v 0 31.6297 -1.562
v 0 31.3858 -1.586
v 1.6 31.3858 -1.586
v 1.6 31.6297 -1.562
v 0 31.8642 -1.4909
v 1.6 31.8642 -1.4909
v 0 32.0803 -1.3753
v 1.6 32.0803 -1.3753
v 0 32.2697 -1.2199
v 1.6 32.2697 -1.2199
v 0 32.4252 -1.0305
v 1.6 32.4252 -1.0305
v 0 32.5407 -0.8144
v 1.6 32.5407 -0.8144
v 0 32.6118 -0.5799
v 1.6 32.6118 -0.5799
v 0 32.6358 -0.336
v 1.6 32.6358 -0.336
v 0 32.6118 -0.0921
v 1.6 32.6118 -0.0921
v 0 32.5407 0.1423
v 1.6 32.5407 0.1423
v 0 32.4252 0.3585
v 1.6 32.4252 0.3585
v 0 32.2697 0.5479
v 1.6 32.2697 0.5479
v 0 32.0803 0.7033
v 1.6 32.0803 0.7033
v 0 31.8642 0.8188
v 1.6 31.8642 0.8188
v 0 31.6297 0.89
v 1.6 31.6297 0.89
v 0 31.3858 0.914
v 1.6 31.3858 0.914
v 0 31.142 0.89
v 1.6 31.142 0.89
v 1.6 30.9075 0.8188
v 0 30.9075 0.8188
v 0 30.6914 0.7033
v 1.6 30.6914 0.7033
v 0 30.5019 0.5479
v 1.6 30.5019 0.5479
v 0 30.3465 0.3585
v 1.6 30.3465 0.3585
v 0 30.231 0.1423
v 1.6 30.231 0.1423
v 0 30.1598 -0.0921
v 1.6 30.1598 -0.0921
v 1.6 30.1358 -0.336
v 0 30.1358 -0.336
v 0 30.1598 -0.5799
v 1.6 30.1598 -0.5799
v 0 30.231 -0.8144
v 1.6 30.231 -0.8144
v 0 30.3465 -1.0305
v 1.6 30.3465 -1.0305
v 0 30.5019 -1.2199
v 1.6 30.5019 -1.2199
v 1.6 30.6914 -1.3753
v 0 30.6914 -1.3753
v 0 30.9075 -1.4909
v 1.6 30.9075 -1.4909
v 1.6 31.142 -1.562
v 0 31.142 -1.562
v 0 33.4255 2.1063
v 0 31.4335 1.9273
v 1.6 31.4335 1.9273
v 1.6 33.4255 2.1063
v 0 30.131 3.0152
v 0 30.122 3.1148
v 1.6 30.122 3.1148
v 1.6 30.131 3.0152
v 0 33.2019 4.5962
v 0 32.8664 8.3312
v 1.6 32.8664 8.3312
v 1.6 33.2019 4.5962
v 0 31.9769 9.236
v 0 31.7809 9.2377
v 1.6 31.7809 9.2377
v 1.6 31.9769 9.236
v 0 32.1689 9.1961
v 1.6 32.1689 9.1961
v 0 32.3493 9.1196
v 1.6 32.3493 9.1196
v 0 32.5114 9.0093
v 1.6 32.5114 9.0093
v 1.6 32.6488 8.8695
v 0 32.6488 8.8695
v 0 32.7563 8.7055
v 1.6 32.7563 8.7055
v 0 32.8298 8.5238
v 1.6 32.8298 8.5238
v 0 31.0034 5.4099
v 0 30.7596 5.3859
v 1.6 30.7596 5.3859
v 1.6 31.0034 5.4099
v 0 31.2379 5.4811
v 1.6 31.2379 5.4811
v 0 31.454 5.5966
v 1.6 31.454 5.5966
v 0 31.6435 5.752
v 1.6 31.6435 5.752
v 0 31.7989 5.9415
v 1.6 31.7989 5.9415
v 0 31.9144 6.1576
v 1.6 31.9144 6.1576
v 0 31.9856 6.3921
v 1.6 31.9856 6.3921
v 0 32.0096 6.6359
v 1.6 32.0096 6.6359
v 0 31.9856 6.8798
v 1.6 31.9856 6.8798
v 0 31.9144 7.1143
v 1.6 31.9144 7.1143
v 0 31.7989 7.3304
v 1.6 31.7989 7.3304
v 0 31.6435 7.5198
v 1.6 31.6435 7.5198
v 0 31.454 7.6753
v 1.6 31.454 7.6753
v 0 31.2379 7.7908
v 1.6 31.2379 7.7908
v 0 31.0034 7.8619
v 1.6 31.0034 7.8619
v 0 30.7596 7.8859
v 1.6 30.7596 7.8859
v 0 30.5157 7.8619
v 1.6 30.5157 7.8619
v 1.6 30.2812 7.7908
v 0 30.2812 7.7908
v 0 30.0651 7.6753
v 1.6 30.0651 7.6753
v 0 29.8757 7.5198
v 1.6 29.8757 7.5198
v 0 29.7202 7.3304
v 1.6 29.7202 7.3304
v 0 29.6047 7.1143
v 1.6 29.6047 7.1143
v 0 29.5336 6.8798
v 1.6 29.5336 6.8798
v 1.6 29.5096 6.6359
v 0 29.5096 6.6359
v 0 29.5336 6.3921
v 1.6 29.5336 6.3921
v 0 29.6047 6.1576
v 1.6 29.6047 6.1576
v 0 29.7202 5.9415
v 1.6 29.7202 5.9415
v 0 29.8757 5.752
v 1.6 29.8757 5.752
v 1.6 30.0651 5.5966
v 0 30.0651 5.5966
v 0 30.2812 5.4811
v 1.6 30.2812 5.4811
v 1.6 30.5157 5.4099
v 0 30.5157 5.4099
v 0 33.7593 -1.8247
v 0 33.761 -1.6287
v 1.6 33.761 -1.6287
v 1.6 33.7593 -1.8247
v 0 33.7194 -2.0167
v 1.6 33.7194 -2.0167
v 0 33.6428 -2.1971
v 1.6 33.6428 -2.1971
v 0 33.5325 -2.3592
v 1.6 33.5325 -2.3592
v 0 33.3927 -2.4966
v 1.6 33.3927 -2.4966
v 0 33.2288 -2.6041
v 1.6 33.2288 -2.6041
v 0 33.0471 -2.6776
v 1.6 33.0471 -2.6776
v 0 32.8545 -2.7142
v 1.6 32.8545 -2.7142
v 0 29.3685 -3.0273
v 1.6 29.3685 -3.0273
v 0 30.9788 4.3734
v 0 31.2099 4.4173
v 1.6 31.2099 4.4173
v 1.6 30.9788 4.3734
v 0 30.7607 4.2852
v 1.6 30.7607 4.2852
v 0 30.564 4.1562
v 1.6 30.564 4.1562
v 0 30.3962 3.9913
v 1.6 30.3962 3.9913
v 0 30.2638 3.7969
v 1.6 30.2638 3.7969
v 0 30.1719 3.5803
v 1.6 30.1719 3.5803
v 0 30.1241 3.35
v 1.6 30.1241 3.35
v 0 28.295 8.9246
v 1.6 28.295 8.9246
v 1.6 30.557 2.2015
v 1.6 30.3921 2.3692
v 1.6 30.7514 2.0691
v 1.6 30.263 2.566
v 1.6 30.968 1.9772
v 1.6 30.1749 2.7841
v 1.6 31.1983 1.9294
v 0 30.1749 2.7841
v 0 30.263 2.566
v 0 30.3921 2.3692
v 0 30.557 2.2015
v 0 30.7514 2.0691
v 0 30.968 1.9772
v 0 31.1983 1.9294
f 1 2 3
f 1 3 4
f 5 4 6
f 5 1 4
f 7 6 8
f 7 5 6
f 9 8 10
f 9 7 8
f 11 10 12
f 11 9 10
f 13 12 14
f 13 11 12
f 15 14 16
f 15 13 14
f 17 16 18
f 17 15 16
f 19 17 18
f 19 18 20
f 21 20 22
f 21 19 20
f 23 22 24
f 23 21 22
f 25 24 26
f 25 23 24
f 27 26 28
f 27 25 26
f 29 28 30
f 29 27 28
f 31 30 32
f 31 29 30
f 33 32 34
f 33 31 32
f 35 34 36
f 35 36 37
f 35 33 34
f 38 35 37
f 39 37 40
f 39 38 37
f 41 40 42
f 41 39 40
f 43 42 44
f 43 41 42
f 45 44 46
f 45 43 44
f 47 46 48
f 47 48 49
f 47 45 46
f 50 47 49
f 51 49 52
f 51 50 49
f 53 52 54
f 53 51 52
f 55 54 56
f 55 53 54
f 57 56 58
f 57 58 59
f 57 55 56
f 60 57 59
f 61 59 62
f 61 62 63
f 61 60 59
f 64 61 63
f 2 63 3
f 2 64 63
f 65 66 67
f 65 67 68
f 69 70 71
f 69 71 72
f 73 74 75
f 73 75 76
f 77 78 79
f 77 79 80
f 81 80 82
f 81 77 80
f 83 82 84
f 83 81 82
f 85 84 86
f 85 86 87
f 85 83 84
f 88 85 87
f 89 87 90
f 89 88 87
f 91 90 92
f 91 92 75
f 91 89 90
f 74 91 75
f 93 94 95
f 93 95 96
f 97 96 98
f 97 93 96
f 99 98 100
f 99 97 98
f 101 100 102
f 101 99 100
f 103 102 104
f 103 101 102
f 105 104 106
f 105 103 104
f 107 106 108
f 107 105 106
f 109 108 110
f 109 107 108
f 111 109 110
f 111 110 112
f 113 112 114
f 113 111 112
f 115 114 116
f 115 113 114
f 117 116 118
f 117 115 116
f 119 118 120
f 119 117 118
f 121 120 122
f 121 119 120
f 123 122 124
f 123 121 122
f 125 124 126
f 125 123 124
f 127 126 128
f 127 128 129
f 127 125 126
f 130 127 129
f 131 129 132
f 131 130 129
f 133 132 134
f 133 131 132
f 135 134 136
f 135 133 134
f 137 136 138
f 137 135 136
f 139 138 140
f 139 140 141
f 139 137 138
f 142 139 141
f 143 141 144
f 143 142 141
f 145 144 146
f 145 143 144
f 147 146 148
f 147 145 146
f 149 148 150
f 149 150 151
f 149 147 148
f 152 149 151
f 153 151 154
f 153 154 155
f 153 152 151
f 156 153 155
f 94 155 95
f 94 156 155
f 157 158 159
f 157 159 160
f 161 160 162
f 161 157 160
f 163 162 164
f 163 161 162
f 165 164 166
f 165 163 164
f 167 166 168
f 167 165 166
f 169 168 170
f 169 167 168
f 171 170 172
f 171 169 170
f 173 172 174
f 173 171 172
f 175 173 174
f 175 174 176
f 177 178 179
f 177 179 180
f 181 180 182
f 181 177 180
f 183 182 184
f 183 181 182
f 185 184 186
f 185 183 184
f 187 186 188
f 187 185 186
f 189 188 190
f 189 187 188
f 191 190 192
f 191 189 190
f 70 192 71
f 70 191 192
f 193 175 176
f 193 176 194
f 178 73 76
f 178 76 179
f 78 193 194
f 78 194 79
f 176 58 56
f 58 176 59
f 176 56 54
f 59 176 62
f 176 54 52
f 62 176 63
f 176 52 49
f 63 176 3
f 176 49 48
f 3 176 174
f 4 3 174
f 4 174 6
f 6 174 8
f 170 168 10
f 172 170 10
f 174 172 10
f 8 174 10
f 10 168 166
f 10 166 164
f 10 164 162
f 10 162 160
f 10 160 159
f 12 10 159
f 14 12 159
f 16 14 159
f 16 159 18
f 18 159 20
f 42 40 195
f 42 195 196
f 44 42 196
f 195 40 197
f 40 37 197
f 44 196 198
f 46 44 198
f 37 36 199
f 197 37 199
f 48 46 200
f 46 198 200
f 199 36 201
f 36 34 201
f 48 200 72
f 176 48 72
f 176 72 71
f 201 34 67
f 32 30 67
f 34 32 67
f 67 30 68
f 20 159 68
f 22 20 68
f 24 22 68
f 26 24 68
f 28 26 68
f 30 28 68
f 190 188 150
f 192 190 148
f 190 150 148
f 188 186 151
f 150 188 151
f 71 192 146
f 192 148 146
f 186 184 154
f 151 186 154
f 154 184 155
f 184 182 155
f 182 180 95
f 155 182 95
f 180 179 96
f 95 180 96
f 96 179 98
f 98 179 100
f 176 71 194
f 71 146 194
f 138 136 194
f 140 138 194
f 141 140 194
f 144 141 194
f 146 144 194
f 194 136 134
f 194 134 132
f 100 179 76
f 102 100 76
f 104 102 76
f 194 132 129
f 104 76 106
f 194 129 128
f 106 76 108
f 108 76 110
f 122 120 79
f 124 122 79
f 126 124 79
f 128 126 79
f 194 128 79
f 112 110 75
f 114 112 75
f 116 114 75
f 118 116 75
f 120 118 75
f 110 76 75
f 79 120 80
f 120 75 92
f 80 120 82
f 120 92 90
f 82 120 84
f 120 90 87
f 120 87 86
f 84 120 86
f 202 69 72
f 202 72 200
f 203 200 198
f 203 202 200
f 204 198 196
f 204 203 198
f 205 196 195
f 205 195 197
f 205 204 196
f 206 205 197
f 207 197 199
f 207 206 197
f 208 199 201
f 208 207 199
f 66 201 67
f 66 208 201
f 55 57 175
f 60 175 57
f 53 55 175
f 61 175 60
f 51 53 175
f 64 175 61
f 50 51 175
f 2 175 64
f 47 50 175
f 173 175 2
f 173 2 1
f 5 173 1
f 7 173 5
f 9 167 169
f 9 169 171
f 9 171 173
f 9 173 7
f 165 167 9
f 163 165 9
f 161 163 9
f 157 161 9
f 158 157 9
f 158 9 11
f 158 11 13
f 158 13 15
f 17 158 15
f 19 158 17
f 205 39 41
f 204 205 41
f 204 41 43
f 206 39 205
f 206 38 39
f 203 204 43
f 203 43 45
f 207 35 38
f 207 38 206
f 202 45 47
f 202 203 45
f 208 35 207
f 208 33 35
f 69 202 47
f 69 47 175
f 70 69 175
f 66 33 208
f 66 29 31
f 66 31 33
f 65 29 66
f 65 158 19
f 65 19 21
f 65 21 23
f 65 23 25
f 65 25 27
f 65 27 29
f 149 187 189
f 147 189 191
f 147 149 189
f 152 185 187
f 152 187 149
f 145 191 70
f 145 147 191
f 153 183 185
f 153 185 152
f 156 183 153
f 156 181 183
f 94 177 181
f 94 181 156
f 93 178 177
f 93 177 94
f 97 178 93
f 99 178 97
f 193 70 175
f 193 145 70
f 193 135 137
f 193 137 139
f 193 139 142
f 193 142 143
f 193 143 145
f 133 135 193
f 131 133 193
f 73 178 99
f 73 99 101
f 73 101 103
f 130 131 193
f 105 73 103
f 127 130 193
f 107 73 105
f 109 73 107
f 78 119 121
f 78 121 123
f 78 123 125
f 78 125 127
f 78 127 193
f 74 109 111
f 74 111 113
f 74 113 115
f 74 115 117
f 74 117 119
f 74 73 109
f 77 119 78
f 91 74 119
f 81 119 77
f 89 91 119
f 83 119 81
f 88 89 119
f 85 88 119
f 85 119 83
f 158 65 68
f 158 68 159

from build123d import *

# Parameters (mm, degrees)
SKETCH_1_R      = 1.25
EXTRUDE_1_DEPTH = 1.6


with BuildPart() as part:
    # Эскиз1 → Бобышка-Вытянуть1 (new body)
    with BuildSketch(Plane(origin=(0, 0, 0), x_dir=(0, 0, -1), z_dir=(1, 0, 0))):
        with BuildLine():
            Line((2.714158993, 32.8544628), (3.027276679, 29.368497035))
            Line((3.027276679, 29.368497035), (-8.924605944, 28.294950683))
            Line((-8.924605944, 28.294950683), (-9.23772363, 31.780916448))
            ThreePointArc((-9.23772363, 31.780916448), (-9.009264175, 32.511390756), (-8.331195608, 32.866368862))
            Line((-8.331195608, 32.866368862), (-4.596232288, 33.201852097))
            Line((-4.596232288, 33.201852097), (-4.417307896, 31.20987166))
            ThreePointArc((-4.417307896, 31.20987166), (-3.991334168, 30.39618938), (-3.114764999, 30.122038033))
            Line((-3.114764999, 30.122038033), (-3.015165977, 30.130984253))
            ThreePointArc((-3.015165977, 30.130984253), (-2.201483696, 30.55695798), (-1.92733235, 31.43352715))
            Line((-1.92733235, 31.43352715), (-2.106256742, 33.425507587))
            Line((-2.106256742, 33.425507587), (1.628706578, 33.760990822))
            ThreePointArc((1.628706578, 33.760990822), (2.359180886, 33.532531367), (2.714158993, 32.8544628))
        make_face()
        with Locations((-6.635920339, 30.759584164)):
            Circle(SKETCH_1_R, mode=Mode.SUBTRACT)
        with Locations((0.336011191, 31.385819536)):
            Circle(SKETCH_1_R, mode=Mode.SUBTRACT)
    extrude(amount=EXTRUDE_1_DEPTH)


solid = part.part
